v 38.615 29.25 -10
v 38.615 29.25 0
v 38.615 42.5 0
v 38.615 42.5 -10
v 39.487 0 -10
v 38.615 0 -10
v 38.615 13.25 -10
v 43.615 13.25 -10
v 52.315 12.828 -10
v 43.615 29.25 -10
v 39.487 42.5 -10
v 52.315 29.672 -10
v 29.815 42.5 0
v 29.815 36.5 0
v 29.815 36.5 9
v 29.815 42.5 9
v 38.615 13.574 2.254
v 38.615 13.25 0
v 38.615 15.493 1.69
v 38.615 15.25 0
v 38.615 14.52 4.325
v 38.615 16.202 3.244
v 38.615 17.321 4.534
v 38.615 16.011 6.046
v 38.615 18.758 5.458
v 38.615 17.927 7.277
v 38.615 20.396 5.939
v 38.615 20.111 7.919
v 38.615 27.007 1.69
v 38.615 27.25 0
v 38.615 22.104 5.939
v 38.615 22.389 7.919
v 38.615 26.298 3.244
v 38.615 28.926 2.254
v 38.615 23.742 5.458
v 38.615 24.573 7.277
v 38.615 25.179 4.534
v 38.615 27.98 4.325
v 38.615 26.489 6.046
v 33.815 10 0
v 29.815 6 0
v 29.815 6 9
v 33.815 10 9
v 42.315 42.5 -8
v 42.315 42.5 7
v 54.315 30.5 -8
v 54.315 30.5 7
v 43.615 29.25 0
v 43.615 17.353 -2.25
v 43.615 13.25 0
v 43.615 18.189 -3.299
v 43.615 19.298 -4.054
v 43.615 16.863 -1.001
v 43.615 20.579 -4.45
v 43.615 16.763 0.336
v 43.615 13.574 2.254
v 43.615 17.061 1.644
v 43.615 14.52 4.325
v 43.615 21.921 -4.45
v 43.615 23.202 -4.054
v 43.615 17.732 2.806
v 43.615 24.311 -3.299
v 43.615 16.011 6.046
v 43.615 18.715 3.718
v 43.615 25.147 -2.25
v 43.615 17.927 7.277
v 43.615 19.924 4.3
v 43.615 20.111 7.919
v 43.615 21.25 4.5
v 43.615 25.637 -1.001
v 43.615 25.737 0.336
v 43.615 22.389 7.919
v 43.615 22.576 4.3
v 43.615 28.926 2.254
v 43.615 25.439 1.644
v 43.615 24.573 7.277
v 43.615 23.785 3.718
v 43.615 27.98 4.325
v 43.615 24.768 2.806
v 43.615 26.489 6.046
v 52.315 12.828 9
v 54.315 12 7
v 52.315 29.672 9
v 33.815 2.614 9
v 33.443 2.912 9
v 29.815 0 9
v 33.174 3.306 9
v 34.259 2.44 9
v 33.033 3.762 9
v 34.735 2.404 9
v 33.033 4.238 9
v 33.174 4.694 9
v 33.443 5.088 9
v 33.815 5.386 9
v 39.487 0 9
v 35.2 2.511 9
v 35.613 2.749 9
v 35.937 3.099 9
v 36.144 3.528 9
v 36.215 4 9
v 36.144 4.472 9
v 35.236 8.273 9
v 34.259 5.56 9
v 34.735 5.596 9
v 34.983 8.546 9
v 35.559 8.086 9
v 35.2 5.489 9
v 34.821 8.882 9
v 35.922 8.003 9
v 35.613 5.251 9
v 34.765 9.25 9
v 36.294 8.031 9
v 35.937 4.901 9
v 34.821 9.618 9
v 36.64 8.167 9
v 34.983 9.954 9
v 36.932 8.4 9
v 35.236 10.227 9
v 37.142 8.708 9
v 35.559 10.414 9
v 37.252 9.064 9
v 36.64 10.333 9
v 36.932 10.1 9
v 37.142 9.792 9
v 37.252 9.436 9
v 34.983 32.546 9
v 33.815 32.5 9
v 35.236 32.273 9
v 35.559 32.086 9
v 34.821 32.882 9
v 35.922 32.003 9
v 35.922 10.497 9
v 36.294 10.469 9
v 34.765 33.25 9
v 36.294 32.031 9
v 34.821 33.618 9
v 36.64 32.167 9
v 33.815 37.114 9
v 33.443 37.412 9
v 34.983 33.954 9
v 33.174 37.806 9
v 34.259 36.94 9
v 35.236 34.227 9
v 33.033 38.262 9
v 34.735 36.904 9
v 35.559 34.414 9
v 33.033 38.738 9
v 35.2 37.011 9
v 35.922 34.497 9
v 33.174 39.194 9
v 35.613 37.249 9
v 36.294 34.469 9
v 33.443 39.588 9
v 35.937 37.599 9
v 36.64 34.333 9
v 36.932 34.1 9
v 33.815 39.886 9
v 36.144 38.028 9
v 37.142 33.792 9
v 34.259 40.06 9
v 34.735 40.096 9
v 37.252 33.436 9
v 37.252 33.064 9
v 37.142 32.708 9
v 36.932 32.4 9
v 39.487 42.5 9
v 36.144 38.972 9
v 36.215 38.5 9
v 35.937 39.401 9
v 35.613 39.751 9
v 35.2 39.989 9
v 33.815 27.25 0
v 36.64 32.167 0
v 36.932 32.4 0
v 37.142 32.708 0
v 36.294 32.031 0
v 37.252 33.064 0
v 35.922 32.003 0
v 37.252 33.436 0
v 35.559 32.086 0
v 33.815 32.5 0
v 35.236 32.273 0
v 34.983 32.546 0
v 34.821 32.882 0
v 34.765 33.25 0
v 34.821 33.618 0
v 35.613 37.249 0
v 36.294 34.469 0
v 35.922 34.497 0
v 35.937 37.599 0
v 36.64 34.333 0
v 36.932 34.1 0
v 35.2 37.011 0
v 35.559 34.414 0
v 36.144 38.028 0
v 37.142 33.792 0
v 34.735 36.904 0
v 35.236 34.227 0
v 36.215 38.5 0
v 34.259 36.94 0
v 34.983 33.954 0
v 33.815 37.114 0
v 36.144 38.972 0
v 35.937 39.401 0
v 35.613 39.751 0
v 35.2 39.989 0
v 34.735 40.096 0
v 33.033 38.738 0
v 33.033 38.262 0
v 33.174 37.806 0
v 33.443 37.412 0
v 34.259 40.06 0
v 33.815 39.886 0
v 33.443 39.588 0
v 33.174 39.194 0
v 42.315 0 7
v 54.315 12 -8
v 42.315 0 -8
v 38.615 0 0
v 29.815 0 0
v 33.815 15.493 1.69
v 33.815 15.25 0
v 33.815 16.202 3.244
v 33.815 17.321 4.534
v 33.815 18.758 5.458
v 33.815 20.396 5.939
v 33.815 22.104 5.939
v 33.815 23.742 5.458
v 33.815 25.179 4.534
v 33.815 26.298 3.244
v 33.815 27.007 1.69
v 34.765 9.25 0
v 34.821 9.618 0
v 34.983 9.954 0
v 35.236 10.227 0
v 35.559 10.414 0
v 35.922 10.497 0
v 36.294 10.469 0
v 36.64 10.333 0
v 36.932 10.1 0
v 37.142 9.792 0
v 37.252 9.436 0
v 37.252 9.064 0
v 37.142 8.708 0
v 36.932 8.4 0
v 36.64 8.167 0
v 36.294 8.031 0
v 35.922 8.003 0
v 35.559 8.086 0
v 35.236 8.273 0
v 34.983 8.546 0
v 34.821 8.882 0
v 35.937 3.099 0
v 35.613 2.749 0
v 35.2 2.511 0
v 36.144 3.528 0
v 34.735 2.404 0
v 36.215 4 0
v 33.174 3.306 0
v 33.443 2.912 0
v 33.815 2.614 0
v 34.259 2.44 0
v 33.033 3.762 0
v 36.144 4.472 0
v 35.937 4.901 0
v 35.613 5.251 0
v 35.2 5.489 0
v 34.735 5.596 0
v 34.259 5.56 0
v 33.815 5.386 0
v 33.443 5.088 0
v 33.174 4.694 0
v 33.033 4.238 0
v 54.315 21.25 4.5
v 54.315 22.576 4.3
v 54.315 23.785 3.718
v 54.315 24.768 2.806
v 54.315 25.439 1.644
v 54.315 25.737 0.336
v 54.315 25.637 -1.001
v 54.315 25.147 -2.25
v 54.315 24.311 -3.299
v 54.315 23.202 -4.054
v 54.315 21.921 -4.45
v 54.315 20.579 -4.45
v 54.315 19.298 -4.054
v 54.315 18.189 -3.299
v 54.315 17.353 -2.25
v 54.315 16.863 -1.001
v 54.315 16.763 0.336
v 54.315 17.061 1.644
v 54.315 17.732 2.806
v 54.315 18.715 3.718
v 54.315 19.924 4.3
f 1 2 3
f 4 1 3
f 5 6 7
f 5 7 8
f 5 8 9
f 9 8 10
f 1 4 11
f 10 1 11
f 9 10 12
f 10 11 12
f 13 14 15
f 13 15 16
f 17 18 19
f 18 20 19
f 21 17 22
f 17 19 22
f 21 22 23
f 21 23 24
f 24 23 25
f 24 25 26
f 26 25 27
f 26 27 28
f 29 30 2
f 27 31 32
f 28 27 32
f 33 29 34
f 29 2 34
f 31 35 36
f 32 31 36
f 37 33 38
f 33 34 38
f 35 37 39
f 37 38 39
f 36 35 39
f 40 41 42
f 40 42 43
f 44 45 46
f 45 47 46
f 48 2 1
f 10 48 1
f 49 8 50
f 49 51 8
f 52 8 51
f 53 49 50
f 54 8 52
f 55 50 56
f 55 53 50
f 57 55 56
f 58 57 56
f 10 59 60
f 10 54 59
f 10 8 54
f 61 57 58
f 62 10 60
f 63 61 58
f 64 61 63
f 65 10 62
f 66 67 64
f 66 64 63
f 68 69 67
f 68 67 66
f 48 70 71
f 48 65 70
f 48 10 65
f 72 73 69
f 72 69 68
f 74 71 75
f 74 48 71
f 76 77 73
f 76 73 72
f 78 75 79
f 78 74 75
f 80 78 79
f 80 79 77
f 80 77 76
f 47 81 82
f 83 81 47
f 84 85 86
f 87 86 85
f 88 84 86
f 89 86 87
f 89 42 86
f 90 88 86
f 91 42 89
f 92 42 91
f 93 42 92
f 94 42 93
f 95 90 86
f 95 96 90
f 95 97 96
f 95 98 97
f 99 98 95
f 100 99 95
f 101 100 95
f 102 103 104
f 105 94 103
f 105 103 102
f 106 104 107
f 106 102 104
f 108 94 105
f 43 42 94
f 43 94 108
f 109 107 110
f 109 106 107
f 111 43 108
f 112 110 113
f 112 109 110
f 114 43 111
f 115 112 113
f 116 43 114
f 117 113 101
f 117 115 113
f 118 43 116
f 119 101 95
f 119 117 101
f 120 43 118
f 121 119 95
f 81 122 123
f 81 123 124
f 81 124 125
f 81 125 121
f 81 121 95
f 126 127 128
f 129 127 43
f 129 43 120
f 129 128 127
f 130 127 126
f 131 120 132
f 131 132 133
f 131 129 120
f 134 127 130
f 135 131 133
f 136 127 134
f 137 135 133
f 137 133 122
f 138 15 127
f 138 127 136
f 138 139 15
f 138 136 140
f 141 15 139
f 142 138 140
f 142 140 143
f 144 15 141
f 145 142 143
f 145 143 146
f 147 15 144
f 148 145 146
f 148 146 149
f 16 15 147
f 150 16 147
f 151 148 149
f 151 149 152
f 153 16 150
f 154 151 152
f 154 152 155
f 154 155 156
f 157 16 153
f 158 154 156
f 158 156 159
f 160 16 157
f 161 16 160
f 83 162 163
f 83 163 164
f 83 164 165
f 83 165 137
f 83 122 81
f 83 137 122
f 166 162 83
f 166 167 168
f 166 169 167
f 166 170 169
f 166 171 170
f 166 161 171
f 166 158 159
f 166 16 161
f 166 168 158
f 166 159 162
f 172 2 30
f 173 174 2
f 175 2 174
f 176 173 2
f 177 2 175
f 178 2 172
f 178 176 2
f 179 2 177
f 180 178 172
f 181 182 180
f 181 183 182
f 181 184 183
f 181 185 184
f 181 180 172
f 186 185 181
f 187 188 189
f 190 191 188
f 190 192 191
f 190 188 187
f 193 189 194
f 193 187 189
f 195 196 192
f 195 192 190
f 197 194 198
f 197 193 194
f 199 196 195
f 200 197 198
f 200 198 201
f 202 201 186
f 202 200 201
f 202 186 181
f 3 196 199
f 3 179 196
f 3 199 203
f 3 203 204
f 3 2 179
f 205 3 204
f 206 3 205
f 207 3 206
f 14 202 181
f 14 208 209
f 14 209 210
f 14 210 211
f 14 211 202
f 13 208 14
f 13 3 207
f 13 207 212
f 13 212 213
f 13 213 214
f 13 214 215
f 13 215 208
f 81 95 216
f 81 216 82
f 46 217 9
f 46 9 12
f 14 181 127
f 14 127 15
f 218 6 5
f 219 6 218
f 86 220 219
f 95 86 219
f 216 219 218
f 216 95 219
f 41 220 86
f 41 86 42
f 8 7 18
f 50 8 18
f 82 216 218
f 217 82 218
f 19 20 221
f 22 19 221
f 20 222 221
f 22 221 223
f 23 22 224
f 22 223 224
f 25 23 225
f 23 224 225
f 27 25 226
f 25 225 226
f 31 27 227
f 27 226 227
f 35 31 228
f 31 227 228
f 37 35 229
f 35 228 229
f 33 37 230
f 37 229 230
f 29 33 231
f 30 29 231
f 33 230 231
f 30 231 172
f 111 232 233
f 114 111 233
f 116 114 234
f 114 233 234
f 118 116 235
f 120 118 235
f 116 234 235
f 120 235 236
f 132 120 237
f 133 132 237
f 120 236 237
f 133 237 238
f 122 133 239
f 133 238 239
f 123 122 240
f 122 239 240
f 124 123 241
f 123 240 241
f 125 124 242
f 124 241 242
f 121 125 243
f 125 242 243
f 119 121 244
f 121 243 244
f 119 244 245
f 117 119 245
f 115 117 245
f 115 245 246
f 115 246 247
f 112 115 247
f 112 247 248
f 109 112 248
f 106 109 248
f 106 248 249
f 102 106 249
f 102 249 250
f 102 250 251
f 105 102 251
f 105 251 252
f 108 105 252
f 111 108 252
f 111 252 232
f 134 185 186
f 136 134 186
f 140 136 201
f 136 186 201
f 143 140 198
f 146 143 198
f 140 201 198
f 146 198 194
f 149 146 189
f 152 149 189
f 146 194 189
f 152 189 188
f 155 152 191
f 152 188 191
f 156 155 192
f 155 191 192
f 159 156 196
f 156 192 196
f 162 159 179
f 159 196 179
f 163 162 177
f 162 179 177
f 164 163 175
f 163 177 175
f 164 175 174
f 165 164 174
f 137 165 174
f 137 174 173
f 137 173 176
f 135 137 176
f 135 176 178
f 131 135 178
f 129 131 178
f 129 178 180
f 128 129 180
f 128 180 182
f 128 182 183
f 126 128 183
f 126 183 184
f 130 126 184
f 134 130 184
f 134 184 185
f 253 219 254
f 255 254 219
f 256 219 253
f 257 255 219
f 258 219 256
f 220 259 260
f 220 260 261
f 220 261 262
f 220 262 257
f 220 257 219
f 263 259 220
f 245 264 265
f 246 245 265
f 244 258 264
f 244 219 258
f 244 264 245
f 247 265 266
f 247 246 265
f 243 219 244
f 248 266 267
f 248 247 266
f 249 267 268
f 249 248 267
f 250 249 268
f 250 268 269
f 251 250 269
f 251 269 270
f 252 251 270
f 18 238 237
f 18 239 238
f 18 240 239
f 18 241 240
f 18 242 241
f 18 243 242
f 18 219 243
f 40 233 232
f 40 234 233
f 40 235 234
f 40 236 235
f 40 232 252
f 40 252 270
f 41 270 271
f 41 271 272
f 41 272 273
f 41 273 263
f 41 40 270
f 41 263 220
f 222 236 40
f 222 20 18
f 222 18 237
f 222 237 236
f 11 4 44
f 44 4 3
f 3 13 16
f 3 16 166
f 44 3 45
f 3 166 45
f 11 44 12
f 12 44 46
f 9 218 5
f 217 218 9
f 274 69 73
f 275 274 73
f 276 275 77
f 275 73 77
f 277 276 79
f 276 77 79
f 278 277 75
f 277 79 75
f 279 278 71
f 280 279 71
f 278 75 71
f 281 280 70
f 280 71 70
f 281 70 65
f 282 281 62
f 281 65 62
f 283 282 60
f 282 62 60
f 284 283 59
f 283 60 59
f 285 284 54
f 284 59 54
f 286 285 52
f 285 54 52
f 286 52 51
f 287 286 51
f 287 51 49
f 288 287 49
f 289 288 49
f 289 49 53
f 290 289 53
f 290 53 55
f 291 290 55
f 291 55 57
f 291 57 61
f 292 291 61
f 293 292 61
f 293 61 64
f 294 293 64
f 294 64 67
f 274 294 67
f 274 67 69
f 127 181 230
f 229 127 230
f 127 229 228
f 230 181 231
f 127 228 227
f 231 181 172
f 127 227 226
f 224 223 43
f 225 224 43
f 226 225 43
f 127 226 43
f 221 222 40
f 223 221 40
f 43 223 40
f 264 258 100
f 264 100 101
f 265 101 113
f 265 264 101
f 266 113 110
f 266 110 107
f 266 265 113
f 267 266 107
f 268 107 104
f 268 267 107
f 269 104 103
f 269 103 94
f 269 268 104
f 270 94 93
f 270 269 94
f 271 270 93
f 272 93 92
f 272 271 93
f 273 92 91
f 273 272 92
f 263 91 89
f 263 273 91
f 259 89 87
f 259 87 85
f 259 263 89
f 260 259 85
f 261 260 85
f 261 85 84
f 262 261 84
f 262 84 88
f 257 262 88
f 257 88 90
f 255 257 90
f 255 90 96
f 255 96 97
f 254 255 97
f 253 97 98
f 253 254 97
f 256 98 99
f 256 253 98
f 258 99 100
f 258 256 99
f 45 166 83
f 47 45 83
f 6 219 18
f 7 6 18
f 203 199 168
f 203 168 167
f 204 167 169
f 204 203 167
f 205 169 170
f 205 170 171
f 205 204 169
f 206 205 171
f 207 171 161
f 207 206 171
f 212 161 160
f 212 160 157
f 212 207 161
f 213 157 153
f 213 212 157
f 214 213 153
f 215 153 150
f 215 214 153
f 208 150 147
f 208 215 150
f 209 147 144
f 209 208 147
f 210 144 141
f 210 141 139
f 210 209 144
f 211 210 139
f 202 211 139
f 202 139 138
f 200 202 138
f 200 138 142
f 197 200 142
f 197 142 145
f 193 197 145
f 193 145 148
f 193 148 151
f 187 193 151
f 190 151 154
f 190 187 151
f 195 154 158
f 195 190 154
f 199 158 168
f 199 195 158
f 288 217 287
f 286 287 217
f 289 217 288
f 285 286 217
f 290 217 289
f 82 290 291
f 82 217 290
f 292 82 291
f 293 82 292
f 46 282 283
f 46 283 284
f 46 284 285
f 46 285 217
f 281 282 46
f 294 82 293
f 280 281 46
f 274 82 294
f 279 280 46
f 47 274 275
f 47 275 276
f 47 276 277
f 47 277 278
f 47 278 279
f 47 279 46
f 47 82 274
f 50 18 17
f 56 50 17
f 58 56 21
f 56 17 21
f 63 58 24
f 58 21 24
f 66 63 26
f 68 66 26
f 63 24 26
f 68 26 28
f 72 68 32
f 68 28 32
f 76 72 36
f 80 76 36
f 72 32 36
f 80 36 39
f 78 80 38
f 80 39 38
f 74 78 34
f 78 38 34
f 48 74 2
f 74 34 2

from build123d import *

# Parameters (mm, degrees)
ESQUISSE1_R                               = 1.6
BOSS_EXTRU_1_DEPTH                        = 9
ESQUISSE2_W                               = 15.7
ESQUISSE2_H                               = 42.5
BOSS_EXTRU_2_DEPTH                        = 19
ESQUISSE4_R                               = 6
ENL_V_MAT_EXTRU_1_DEPTH                   = 4.8
ENL_V_MAT_EXTRU_2_DEPTH                   = 5
ESQUISSE6_R                               = 4.5
ENL_V_MAT_EXTRU_3_DEPTH                   = 11.7
CHANFREIN1_SIZE                           = 12
CHANFREIN2_SIZE                           = 2
TROU_POUR_TARAUDAGE_POUR_TROU_TARAUD_M3_D = 2.5


with BuildPart() as part:
    # Esquisse1 → Boss.-Extru.1 (new body)
    with BuildSketch(Plane.XY):
        Polygon((38.615489841, 27.25), (38.615489841, 15.25), (38.615489841, 0), (29.815489841, 0), (29.815489841, 6), (33.815489841, 10), (33.815489841, 15.25), (33.815489841, 27.25), (33.815489841, 32.5), (29.815489841, 36.5), (29.815489841, 42.5), (38.615489841, 42.5), align=None)
        with Locations((34.615489841, 4)):
            Circle(ESQUISSE1_R, mode=Mode.SUBTRACT)
        with Locations((34.615489841, 38.5)):
            Circle(ESQUISSE1_R, mode=Mode.SUBTRACT)
    extrude(amount=BOSS_EXTRU_1_DEPTH)

    # Esquisse2 → Boss.-Extru.2 (add)
    with BuildSketch(Plane.XY.offset(9)):
        with Locations((46.465489841, 21.25)):
            Rectangle(ESQUISSE2_W, ESQUISSE2_H)
    extrude(amount=-BOSS_EXTRU_2_DEPTH)

    # Esquisse4 → Enlèv. mat.-Extru.1 (cut)
    with BuildSketch(Plane.ZY.offset(-33.815489841)):
        with Locations((0, 21.25)):
            Circle(ESQUISSE4_R)
    extrude(amount=-ENL_V_MAT_EXTRU_1_DEPTH, mode=Mode.SUBTRACT)

    # Esquisse5 → Enlèv. mat.-Extru.2 (cut)
    with BuildSketch(Plane.ZY.offset(-38.615489841)):
        with BuildLine():
            Line((0, 29.25), (-10, 29.25))
            Line((-10, 29.25), (-10, 13.25))
            Line((-10, 13.25), (0, 13.25))
            ThreePointArc((0, 13.25), (8, 21.25), (0, 29.25))
        make_face()
    extrude(amount=-ENL_V_MAT_EXTRU_2_DEPTH, mode=Mode.SUBTRACT)

    # Esquisse6 → Enlèv. mat.-Extru.3 (cut, through all)
    with BuildSketch(Plane.ZY.offset(-43.615489841)):
        with Locations((0, 21.25)):
            Circle(ESQUISSE6_R)
    extrude(amount=-ENL_V_MAT_EXTRU_3_DEPTH, mode=Mode.SUBTRACT)

    # Chanfrein1
    chanfrein1_edges = [part.edges().sort_by_distance(p)[0] for p in [
        (54.315489841, 0, -0.5),
        (54.315489841, 42.5, -0.5),
    ]]
    chamfer(chanfrein1_edges, length=CHANFREIN1_SIZE)

    # Chanfrein2
    chanfrein2_edges = [part.edges().sort_by_distance(p)[0] for p in [
        (54.315489841, 21.25, -10),
        (54.315489841, 21.25, 9),
        (48.315489841, 6, 9),
        (48.315489841, 36.5, 9),
        (48.315489841, 6, -10),
        (48.315489841, 36.5, -10),
    ]]
    chamfer(chanfrein2_edges, length=CHANFREIN2_SIZE)

    # Trou pour taraudage pour trou taraudé M31 (through all)
    with Locations(Plane.XY.offset(9)):
        with Locations((36.015489841, 33.25), (36.015489841, 9.25)):
            Hole(TROU_POUR_TARAUDAGE_POUR_TROU_TARAUD_M3_D / 2)


solid = part.part
